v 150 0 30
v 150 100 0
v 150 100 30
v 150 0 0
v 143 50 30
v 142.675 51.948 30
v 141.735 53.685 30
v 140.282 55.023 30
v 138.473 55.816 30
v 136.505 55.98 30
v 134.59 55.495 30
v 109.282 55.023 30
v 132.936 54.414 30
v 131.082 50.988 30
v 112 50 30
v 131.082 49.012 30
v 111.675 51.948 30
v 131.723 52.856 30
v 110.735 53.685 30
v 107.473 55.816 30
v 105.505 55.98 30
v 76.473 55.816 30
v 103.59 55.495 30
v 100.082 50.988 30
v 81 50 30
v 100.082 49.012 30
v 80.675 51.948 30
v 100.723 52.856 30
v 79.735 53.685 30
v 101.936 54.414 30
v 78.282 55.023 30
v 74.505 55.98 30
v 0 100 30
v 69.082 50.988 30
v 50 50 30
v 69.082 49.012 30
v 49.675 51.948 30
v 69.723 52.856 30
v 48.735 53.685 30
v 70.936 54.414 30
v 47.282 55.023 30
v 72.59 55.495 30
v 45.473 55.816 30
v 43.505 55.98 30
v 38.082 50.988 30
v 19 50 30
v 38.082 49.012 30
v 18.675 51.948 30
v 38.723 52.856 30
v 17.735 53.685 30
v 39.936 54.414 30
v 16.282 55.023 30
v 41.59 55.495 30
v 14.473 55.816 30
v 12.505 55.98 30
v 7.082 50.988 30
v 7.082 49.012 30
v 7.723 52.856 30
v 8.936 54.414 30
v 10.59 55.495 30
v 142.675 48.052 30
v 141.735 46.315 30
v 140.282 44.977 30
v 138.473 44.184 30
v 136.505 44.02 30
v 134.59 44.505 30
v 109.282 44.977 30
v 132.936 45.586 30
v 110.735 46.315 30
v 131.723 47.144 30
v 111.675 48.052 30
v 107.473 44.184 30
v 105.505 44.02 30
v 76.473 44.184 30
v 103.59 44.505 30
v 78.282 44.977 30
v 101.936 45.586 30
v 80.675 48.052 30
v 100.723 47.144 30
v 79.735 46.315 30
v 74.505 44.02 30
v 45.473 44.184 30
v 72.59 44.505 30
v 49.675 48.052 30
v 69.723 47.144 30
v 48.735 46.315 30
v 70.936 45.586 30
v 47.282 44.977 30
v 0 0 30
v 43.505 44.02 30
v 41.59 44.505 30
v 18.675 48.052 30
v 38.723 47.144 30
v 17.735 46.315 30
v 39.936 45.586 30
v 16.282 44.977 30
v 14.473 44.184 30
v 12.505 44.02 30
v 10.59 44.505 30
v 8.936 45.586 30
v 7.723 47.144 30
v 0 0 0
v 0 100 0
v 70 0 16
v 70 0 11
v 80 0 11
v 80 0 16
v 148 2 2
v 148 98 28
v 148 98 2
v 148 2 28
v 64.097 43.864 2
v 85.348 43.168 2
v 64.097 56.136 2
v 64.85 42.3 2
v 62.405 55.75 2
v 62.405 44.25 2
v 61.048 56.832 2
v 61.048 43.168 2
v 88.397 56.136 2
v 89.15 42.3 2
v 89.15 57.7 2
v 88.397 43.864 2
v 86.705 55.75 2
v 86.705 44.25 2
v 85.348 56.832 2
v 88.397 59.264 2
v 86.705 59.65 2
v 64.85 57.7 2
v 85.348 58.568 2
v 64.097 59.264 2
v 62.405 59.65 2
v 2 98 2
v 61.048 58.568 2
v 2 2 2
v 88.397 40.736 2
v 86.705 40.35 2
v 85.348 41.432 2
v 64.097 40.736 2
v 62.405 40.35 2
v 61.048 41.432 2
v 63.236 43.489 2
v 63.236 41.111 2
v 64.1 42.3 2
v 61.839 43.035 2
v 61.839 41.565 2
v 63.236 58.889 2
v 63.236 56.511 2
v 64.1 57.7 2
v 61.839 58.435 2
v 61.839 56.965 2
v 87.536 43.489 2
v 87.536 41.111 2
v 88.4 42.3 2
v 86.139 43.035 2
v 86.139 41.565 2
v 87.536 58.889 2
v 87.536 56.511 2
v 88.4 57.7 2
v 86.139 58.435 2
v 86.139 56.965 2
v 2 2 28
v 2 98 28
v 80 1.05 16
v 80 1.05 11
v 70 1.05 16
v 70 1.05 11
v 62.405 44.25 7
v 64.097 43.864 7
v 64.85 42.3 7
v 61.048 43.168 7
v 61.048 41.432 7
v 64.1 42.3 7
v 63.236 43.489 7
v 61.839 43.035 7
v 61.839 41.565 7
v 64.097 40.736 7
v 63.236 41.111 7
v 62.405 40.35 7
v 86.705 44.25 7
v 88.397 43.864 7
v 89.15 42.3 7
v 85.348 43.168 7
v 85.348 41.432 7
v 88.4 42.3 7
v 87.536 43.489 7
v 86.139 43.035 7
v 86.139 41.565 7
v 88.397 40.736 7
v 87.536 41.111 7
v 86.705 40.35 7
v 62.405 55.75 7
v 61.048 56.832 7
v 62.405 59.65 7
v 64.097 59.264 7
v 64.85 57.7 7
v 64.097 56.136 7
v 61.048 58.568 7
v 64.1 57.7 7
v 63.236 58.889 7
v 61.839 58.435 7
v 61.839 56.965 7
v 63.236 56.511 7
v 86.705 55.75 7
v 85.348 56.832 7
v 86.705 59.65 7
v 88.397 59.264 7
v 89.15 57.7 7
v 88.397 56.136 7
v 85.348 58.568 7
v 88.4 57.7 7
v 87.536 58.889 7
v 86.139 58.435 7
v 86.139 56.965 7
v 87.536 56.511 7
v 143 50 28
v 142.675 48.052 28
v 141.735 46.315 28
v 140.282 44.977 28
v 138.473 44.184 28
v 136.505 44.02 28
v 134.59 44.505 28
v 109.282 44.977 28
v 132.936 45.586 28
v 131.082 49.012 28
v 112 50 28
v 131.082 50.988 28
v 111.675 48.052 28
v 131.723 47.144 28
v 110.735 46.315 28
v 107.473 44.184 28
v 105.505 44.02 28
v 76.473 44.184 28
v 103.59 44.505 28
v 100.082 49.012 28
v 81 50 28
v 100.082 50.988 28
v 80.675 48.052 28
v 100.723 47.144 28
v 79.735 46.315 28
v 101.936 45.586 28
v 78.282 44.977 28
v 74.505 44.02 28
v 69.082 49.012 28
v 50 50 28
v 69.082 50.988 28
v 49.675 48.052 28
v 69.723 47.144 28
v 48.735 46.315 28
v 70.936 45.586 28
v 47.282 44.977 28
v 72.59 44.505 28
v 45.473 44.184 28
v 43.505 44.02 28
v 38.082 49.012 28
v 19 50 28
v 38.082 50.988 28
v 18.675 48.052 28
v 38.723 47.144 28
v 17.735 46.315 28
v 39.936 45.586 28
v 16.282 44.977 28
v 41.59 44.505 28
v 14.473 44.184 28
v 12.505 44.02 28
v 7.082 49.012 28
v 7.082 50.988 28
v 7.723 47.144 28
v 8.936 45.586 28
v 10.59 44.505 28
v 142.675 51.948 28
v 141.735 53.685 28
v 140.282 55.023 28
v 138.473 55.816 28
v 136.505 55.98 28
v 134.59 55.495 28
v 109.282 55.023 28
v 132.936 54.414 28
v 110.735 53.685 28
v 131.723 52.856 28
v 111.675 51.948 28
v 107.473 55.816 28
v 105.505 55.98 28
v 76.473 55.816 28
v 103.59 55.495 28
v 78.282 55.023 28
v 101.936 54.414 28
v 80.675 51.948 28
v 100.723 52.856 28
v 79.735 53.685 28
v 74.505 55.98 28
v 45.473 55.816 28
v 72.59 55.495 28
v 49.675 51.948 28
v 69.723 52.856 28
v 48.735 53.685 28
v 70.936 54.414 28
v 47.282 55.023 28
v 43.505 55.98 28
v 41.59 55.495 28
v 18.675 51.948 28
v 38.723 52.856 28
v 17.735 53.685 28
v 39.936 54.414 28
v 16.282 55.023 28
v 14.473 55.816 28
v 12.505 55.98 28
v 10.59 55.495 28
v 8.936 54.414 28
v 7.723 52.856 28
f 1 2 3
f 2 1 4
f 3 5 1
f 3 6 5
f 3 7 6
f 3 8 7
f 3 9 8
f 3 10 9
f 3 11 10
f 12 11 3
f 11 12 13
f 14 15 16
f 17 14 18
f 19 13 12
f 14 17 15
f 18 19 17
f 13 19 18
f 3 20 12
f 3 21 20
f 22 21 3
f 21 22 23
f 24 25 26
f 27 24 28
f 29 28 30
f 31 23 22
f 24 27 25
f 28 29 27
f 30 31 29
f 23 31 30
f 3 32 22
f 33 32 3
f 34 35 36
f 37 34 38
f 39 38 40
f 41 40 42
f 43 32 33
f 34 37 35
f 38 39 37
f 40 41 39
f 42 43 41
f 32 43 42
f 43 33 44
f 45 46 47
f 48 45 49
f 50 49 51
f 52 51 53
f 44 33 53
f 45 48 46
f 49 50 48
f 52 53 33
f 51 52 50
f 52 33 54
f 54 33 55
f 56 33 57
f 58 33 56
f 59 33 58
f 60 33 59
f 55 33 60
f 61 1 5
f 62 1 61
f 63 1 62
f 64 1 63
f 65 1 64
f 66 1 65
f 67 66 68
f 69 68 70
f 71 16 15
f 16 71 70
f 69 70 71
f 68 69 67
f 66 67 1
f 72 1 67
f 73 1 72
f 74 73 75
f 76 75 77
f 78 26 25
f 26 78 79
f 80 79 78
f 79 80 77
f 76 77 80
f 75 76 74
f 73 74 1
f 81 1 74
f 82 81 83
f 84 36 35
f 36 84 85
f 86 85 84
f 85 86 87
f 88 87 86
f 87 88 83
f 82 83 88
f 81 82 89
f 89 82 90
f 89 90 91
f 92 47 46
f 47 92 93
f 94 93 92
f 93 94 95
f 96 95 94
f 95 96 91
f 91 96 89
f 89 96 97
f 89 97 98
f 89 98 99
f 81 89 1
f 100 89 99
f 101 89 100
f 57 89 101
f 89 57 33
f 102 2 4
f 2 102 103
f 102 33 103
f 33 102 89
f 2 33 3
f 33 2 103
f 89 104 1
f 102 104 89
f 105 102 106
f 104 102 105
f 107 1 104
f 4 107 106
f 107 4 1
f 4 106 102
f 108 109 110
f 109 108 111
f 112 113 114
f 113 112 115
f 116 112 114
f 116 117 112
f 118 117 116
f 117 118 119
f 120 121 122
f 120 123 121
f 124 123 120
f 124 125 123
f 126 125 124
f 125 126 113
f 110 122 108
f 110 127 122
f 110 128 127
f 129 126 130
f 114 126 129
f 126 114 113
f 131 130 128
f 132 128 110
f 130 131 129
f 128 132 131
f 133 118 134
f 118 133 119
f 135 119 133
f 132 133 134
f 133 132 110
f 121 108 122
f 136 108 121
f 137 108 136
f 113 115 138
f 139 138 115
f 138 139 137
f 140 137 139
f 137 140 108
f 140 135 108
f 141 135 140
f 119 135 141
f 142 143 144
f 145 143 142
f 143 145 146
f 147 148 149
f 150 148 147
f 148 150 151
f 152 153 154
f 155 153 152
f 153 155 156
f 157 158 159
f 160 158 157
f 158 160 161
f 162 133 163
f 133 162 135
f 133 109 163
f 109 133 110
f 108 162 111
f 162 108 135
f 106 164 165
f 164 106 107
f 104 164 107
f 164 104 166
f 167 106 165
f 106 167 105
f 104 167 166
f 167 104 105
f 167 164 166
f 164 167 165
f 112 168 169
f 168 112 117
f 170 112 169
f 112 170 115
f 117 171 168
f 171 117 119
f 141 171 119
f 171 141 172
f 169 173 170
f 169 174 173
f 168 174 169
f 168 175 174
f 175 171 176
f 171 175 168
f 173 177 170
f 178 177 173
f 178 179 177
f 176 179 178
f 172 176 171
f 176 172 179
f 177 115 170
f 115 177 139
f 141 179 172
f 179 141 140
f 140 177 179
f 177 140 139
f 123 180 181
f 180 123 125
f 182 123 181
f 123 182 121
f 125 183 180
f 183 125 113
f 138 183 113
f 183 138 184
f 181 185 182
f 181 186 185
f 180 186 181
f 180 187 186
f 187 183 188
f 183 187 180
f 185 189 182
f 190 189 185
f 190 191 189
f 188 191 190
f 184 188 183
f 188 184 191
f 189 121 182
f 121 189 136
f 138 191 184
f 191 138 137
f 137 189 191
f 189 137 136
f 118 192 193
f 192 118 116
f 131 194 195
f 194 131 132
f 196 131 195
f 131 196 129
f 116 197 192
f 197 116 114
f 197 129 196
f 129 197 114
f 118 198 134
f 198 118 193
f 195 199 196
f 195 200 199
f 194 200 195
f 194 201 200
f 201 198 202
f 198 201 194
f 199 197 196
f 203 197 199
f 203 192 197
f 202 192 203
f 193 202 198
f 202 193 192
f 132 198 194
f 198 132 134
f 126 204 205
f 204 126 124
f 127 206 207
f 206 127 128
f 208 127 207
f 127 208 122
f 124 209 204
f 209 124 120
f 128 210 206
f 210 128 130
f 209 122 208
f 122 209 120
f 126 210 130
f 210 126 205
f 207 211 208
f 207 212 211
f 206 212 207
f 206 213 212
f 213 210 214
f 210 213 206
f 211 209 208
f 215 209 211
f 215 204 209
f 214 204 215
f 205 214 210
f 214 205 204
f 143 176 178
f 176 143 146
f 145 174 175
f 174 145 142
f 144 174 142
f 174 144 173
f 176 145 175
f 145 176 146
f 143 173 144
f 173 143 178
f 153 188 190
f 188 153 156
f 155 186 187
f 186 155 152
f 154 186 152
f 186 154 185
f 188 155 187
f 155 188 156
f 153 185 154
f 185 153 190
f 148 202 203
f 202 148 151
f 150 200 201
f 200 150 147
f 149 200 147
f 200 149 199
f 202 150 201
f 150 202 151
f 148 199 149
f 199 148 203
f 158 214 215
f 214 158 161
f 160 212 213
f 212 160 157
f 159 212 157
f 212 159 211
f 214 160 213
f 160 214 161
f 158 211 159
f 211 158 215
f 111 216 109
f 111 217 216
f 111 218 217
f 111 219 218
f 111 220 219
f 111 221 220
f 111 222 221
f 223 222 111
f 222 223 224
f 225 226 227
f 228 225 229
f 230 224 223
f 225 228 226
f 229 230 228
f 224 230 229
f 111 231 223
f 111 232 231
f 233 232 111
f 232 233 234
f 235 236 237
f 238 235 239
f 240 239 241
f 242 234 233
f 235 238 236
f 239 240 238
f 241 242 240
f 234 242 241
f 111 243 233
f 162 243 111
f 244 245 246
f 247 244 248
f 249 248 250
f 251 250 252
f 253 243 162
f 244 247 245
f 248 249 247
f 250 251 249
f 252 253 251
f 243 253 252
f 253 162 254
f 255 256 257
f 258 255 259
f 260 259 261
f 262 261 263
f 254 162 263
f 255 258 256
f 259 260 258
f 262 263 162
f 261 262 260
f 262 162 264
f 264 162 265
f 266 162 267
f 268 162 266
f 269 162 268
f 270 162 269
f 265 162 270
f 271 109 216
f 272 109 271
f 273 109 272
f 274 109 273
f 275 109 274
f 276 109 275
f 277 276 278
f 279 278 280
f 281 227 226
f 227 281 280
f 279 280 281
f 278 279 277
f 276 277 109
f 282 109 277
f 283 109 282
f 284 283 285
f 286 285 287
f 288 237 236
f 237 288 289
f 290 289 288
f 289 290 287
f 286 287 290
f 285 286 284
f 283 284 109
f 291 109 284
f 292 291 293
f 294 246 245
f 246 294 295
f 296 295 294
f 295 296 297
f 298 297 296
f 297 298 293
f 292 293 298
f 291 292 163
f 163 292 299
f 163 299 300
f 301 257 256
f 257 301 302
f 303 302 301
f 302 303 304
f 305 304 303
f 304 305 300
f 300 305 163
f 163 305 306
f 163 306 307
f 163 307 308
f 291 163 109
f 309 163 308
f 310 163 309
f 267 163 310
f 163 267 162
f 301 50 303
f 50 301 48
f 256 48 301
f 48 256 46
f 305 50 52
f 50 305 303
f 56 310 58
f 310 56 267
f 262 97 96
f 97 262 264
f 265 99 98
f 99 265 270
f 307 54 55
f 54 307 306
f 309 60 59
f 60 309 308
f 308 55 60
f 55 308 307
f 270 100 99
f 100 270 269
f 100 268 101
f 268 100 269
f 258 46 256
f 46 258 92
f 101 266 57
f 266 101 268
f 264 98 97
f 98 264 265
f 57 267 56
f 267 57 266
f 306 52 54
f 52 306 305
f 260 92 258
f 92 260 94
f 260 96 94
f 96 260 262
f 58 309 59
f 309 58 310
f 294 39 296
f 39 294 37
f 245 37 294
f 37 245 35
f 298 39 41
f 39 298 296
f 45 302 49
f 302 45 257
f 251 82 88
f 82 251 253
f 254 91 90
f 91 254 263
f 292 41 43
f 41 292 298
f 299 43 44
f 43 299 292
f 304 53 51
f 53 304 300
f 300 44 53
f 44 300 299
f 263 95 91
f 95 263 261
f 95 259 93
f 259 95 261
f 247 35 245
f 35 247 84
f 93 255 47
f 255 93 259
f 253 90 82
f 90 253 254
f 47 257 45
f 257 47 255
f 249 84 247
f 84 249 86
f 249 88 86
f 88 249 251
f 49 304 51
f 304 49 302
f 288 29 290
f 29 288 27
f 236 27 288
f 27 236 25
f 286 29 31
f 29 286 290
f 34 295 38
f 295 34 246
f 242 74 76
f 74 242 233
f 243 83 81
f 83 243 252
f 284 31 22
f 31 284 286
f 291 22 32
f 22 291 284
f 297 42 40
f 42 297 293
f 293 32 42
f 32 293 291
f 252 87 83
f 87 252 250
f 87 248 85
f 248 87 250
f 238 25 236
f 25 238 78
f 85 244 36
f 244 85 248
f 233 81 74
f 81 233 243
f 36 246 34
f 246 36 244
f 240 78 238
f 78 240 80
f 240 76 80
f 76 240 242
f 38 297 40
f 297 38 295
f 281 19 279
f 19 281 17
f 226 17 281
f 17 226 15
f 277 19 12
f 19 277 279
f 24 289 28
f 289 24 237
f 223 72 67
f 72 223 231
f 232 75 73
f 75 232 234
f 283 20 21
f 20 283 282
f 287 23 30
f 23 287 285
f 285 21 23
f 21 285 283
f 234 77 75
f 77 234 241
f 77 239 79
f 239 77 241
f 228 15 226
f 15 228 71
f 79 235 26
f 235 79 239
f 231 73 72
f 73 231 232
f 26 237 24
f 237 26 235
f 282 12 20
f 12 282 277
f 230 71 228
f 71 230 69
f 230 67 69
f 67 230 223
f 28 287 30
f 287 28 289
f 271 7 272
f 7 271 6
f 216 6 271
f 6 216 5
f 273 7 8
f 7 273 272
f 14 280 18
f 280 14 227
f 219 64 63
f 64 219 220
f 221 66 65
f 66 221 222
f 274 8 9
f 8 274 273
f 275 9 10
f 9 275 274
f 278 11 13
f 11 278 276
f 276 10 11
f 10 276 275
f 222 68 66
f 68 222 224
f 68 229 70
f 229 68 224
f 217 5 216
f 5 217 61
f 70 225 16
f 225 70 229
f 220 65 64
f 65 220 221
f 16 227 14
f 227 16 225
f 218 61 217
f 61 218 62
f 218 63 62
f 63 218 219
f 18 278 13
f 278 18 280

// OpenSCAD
union() {
	union() {
		difference() {
			union() {
				cube(size = [150, 100, 2]);
				difference() {
					cube(size = [150, 100, 30]);
					translate(v = [2, 2, 2]) {
						cube(size = [146, 96, 28]);
					}
				}
			}
			translate(v = [75.0000000000, 0, 13.5000000000]) {
				cube(center = true, size = [10, 2.1000000000, 5]);
			}
		}
		difference() {
			union() {
				translate(v = [62.8500000000, 42.3000000000, 2]) {
					cylinder(d = 4, h = 5);
				}
				translate(v = [87.1500000000, 42.3000000000, 2]) {
					cylinder(d = 4, h = 5);
				}
				translate(v = [62.8500000000, 57.7000000000, 2]) {
					cylinder(d = 4, h = 5);
				}
				translate(v = [87.1500000000, 57.7000000000, 2]) {
					cylinder(d = 4, h = 5);
				}
			}
			union() {
				translate(v = [62.8500000000, 42.3000000000, 2]) {
					cylinder(d = 2.5000000000, h = 5.1000000000);
				}
				translate(v = [87.1500000000, 42.3000000000, 2]) {
					cylinder(d = 2.5000000000, h = 5.1000000000);
				}
				translate(v = [62.8500000000, 57.7000000000, 2]) {
					cylinder(d = 2.5000000000, h = 5.1000000000);
				}
				translate(v = [87.1500000000, 57.7000000000, 2]) {
					cylinder(d = 2.5000000000, h = 5.1000000000);
				}
			}
		}
	}
	translate(v = [0, 0, 28]) {
		difference() {
			cube(size = [150, 100, 2]);
			union() {
				translate(v = [-18.0000000000, 50.0000000000, 0]) {
					cylinder(d = 12, h = 2.1000000000);
				}
				translate(v = [13.0000000000, 50.0000000000, 0]) {
					cylinder(d = 12, h = 2.1000000000);
				}
				translate(v = [44.0000000000, 50.0000000000, 0]) {
					cylinder(d = 12, h = 2.1000000000);
				}
				translate(v = [75.0000000000, 50.0000000000, 0]) {
					cylinder(d = 12, h = 2.1000000000);
				}
				translate(v = [106.0000000000, 50.0000000000, 0]) {
					cylinder(d = 12, h = 2.1000000000);
				}
				translate(v = [137.0000000000, 50.0000000000, 0]) {
					cylinder(d = 12, h = 2.1000000000);
				}
				translate(v = [168.0000000000, 50.0000000000, 0]) {
					cylinder(d = 12, h = 2.1000000000);
				}
			}
			translate(v = [65.0000000000, 1.0000000000, 29.0000000000]) {
				cylinder(center = true, d = 3, h = 2.1000000000);
			}
		}
	}
}
